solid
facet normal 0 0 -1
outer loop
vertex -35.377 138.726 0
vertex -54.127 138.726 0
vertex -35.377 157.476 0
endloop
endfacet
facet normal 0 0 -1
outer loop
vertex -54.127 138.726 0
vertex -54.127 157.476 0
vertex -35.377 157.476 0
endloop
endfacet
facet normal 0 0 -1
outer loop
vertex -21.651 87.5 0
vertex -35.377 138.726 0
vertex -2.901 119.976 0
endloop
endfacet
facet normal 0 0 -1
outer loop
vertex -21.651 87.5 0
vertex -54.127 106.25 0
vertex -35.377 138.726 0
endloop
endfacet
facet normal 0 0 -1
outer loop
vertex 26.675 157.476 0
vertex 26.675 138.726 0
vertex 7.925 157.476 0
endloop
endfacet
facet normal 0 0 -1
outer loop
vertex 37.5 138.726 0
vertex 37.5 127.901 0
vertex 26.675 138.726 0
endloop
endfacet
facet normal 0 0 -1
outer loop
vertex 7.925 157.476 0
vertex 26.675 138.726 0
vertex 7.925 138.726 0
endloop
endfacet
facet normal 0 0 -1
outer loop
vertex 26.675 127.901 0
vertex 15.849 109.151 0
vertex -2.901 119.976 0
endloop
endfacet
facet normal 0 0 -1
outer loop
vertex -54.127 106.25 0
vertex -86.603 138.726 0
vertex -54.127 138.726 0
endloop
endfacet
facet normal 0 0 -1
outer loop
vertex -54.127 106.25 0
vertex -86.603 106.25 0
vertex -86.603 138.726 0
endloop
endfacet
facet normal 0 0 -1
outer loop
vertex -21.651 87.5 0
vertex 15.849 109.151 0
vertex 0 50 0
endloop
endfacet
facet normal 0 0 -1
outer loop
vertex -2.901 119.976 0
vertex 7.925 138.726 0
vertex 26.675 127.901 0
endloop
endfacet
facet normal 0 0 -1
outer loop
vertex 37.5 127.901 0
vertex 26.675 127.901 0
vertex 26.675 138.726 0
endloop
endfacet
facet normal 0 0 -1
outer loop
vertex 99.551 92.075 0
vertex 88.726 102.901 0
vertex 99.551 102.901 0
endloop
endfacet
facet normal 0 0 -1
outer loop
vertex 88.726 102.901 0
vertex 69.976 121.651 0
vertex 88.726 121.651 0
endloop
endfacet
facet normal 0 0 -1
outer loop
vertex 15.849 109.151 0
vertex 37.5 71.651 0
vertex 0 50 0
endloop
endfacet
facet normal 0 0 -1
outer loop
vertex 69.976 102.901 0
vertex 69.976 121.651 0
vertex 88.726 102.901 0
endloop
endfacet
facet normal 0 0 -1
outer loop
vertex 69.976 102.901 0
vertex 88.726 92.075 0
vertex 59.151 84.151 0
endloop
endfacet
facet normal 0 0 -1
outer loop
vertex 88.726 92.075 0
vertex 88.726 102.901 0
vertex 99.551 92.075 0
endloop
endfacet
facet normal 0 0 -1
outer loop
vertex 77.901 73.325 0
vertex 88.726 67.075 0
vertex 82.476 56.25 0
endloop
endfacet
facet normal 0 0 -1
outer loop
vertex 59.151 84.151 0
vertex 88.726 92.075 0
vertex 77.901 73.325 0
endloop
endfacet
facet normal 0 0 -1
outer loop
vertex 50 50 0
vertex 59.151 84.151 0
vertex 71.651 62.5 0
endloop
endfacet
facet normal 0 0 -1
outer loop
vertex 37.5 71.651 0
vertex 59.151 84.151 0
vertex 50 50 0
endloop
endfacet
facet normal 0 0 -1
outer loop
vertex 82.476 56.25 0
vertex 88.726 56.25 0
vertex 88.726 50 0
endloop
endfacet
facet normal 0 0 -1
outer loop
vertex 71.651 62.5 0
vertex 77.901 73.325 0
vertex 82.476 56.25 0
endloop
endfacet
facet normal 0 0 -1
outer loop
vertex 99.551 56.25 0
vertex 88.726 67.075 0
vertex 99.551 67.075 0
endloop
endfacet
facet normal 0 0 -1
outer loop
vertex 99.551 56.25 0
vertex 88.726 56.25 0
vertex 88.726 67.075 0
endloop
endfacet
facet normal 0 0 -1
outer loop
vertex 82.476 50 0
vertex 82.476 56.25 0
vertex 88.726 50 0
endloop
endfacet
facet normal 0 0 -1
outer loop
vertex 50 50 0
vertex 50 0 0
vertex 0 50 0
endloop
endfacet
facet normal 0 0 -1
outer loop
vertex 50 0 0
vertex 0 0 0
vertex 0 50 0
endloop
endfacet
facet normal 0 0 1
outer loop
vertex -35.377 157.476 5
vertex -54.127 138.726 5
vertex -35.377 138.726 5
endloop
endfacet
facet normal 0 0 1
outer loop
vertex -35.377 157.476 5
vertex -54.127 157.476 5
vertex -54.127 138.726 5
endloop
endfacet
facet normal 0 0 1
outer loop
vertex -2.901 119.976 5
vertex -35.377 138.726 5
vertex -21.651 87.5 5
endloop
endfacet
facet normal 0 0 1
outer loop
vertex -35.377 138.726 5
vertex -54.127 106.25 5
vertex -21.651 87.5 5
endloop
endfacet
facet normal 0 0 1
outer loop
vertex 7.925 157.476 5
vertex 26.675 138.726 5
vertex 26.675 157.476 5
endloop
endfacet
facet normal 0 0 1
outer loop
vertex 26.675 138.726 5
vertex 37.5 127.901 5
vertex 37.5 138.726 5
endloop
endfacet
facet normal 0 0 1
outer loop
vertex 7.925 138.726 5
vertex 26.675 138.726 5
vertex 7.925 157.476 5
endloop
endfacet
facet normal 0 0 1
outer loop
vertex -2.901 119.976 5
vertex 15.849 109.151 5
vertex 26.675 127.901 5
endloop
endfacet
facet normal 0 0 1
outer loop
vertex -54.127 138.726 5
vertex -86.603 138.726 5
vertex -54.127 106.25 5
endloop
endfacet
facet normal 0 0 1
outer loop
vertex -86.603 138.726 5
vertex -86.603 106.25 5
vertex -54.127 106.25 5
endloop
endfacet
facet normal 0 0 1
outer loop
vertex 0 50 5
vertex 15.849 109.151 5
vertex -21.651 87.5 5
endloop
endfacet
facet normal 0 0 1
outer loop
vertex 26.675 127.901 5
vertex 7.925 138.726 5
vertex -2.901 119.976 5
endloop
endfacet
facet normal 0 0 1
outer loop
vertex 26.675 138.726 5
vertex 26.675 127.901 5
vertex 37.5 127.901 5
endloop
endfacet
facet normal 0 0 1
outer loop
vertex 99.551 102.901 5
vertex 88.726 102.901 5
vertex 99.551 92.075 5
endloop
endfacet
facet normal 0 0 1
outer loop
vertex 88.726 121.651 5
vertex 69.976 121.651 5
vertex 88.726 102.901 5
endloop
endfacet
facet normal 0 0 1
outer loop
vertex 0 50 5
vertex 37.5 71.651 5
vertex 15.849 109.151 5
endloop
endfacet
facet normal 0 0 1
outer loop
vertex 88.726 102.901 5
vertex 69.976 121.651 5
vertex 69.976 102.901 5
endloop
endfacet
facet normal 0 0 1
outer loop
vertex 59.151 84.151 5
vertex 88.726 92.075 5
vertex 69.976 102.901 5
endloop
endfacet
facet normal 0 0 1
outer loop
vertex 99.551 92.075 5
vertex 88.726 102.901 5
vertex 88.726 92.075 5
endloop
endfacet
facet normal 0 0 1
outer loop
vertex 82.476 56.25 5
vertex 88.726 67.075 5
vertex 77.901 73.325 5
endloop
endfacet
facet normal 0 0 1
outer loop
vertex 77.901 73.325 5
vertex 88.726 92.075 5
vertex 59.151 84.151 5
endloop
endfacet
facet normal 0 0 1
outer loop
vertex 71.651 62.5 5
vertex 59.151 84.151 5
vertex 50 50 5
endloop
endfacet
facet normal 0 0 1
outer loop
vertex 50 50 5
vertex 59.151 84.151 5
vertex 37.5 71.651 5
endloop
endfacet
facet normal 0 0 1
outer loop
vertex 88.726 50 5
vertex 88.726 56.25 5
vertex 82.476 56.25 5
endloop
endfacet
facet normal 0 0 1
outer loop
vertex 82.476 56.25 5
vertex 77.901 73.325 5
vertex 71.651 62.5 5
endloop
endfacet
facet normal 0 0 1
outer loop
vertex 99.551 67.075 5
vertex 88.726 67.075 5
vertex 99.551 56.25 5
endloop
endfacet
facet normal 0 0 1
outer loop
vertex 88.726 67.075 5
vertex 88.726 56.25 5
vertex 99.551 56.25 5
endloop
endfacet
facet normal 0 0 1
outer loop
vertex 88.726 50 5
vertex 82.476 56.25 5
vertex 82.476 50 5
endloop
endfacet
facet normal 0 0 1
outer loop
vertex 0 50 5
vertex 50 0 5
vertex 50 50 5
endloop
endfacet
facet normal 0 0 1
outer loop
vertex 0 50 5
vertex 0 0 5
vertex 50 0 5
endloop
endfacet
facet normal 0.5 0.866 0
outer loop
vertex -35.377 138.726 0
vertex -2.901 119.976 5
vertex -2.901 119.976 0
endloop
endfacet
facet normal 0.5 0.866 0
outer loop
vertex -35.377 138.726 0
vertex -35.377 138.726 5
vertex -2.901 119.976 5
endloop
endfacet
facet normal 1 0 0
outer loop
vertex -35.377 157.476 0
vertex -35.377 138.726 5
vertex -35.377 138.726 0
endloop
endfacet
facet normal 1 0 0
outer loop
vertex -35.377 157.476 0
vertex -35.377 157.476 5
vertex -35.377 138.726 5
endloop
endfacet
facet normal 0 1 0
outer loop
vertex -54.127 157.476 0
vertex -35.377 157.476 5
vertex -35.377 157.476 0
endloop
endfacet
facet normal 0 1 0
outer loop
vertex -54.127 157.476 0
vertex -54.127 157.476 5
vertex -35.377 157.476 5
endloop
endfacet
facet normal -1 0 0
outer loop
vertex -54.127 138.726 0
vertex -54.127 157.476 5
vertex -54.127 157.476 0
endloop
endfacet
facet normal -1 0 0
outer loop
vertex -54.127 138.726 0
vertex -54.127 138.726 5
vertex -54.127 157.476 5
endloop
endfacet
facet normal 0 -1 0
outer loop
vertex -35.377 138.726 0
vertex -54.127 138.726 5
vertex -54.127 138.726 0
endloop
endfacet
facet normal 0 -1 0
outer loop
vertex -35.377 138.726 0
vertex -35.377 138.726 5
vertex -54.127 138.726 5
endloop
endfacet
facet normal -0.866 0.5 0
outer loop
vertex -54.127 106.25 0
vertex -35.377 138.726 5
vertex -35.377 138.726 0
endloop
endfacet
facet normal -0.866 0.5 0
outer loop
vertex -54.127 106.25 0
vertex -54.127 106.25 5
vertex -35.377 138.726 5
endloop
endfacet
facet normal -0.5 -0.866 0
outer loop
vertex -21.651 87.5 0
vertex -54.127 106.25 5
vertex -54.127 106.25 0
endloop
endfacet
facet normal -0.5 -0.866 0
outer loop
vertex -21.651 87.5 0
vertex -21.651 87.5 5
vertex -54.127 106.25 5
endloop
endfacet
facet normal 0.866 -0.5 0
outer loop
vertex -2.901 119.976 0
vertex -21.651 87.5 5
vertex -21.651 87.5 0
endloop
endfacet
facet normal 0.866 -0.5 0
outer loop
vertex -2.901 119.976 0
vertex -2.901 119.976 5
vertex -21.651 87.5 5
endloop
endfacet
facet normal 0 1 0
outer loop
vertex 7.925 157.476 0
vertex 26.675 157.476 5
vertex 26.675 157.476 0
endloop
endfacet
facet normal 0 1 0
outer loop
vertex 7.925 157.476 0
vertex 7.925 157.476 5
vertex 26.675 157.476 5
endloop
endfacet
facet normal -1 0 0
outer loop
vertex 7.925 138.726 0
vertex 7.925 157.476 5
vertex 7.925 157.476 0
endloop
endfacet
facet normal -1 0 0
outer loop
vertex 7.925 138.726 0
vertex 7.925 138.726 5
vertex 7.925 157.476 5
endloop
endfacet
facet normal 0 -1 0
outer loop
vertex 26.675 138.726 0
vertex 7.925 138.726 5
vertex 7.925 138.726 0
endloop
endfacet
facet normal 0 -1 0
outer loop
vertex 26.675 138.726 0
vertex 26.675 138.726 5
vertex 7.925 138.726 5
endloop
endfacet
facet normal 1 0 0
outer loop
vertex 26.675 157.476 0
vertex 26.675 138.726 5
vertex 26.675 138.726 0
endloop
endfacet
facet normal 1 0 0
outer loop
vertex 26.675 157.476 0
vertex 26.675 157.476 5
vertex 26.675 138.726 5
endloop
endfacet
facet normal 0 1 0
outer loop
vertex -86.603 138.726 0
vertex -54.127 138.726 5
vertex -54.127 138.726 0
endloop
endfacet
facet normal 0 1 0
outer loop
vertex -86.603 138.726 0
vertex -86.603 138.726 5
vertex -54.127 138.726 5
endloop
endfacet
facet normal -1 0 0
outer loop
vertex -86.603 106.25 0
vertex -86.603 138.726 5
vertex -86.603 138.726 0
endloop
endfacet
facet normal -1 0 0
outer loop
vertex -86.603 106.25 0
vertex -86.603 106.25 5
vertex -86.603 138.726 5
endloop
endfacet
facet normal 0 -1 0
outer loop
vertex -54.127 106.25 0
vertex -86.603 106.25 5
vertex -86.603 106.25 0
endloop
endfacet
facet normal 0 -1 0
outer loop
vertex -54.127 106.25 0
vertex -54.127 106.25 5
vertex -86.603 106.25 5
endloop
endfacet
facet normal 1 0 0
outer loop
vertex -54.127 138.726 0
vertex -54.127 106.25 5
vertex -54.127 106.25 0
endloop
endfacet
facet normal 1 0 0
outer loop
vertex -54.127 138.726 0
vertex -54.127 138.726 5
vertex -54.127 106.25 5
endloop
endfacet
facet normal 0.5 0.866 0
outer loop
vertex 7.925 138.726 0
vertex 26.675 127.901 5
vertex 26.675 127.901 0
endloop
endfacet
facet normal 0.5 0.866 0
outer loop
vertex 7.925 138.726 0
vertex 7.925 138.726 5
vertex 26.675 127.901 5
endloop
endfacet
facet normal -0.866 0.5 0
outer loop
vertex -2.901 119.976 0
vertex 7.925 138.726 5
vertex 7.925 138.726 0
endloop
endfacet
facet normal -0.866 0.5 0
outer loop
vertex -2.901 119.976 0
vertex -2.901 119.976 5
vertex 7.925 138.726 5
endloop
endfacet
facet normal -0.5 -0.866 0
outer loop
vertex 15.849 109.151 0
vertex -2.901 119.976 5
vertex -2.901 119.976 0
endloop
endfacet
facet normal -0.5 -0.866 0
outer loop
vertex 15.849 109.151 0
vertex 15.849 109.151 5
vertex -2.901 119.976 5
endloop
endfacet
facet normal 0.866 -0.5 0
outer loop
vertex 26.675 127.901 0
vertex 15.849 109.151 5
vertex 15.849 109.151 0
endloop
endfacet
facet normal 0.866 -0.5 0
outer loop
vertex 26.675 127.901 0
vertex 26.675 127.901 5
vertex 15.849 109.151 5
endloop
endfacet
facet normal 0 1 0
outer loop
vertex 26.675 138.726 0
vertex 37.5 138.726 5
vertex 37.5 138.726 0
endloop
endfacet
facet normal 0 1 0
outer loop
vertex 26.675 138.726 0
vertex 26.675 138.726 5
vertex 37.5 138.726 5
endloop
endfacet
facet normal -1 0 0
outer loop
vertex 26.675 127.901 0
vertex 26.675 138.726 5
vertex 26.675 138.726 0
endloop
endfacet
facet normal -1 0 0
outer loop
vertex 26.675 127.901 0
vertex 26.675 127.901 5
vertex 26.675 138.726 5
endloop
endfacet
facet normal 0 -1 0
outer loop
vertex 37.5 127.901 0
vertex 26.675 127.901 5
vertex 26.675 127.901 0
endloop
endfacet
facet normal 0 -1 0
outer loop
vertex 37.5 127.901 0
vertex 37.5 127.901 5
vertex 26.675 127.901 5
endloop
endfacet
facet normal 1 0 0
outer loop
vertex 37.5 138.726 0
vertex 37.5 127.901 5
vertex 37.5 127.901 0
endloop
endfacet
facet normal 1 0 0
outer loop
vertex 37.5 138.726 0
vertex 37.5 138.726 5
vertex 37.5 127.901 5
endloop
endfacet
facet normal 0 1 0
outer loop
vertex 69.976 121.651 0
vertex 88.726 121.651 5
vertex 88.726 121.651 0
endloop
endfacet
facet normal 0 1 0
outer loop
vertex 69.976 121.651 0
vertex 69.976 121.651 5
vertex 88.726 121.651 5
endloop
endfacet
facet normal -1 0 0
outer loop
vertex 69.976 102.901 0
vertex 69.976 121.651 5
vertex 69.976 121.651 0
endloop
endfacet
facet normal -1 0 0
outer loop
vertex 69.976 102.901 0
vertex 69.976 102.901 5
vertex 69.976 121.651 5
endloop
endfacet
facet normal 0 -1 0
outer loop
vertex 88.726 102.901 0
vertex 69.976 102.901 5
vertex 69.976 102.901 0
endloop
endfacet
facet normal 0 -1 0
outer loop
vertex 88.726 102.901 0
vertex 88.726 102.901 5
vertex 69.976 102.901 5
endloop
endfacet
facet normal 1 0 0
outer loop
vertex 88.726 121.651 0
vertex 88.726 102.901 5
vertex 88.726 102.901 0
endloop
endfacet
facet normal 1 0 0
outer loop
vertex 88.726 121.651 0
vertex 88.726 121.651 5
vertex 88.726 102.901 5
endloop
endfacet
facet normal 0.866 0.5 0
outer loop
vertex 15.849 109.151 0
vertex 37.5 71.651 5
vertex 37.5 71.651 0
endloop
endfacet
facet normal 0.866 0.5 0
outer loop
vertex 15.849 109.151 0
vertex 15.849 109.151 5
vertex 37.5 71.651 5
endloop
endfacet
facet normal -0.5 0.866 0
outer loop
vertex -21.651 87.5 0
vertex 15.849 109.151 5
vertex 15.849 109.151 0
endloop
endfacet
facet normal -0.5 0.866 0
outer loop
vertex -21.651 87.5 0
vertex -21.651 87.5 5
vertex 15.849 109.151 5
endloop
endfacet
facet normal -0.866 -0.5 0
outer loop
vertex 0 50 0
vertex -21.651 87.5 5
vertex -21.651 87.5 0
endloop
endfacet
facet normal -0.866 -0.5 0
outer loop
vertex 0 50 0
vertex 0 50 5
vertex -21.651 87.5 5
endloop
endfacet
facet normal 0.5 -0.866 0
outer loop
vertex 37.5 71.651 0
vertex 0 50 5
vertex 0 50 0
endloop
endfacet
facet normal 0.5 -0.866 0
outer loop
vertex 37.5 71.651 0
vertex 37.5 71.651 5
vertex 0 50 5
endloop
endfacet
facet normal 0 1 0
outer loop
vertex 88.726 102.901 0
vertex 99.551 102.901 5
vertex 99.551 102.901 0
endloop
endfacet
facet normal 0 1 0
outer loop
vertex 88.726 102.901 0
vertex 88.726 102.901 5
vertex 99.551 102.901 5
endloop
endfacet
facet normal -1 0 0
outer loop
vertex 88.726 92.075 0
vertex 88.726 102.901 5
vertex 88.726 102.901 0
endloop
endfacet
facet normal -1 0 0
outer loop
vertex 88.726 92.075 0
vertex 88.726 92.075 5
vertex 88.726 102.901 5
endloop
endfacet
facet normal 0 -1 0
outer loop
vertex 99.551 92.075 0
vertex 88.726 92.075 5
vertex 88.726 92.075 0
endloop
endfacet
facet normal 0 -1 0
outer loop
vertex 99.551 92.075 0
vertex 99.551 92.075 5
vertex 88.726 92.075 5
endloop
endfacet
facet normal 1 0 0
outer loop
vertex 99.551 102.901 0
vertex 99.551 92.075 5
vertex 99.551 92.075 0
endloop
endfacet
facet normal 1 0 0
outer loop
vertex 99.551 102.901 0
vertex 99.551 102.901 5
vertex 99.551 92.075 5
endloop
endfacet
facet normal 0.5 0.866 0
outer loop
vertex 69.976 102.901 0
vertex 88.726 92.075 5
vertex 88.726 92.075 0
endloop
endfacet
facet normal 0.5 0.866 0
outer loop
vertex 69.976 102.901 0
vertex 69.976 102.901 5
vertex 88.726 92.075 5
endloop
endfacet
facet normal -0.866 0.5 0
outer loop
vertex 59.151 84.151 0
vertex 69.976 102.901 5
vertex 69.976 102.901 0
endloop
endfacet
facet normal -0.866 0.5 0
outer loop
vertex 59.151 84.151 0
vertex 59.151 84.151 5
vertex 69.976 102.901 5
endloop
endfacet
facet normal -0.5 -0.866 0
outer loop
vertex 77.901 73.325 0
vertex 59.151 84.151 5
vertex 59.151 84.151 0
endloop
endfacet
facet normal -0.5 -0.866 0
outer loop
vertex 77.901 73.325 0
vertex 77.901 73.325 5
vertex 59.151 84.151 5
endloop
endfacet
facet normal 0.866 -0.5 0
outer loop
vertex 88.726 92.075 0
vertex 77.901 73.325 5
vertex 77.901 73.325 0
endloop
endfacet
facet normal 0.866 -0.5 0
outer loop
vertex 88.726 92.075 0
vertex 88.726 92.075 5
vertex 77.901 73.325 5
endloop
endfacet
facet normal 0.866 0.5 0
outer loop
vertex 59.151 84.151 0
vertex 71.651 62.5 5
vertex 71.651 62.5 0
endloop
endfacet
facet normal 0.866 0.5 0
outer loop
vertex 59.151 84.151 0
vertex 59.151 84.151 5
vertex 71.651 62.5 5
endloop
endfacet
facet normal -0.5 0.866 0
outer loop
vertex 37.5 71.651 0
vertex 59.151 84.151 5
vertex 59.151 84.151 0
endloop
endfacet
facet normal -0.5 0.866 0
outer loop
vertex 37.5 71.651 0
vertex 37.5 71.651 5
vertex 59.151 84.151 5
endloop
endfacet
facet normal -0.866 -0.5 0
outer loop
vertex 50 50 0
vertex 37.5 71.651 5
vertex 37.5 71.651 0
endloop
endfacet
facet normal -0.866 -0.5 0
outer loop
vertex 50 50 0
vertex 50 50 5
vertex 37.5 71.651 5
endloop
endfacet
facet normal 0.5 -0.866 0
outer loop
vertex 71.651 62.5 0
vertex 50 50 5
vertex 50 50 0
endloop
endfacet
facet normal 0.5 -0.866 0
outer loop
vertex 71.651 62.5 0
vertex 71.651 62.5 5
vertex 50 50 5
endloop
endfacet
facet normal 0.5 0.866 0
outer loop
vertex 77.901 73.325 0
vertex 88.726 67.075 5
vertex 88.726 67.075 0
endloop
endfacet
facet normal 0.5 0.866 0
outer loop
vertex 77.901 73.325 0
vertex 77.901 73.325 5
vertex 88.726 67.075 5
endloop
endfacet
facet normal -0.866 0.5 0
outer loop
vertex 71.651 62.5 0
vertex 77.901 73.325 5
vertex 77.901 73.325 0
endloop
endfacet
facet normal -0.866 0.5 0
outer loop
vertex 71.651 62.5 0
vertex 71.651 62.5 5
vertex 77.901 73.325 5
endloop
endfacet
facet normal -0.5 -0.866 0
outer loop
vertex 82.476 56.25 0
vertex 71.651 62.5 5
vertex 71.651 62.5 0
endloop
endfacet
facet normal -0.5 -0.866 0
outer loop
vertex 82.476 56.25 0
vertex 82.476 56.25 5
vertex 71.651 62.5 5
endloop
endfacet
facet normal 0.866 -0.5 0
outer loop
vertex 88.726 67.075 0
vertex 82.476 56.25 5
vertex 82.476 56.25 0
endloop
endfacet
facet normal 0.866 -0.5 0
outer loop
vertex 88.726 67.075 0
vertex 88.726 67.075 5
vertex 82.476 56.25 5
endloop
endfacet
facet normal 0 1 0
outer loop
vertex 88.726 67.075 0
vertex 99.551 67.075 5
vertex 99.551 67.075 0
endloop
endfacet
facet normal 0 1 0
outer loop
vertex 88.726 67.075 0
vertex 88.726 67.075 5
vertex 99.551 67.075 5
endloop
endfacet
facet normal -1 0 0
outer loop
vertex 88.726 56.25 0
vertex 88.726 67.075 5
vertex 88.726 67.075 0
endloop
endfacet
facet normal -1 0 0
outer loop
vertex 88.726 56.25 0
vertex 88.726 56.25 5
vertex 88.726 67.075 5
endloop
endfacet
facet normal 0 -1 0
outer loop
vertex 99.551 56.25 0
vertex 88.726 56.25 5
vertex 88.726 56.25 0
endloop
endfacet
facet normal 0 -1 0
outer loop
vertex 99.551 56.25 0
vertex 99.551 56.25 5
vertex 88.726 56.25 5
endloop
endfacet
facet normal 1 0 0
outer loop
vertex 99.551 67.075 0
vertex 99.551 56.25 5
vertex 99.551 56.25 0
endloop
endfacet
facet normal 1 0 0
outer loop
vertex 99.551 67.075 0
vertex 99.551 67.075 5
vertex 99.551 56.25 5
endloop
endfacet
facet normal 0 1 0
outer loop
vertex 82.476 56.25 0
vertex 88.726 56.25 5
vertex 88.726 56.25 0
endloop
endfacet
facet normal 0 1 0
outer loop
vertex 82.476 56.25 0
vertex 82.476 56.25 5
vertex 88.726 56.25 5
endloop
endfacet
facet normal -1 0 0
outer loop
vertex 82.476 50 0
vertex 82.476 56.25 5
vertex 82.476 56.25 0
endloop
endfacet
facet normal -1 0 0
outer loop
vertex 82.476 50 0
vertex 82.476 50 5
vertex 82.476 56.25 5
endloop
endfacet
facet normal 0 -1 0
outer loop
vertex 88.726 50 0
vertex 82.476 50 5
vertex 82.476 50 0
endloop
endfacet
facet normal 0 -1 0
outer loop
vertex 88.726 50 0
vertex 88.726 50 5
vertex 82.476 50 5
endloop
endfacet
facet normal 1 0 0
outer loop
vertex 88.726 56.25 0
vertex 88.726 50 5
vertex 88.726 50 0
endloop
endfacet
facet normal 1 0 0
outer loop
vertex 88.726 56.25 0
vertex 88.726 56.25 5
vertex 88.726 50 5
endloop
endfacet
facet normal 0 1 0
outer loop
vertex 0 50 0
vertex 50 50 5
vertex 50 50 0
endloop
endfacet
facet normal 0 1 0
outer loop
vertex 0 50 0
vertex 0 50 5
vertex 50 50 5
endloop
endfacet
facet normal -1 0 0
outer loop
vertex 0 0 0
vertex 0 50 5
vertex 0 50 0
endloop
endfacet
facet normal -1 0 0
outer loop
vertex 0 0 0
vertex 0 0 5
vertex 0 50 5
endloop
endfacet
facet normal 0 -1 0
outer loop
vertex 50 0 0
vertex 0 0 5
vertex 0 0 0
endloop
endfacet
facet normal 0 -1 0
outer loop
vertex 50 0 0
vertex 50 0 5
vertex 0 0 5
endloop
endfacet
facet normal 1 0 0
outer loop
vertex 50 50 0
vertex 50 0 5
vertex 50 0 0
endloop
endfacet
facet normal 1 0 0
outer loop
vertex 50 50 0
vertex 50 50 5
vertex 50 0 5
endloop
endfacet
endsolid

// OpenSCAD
/* # Parameterized Pythagorean Tree
 *
 * A _Pythagorean Tree_ is a
 *
 * > plane fractal constructed from squares
 *
 * ## Parameters
 *
 * * **depth**: the maximum number of levels to render.
 * * **angle**: the angle which the next square is rotated.
 * * **size**: the size of the side of the base square.
 *
 */

linear_extrude(5) tree(depth = 3, angle=30, size=50);

module tree(depth=2, angle=45, size=10){
  square([size, size]);
  if (depth != 0) {
     translate([0   , size, 0]) rotate(angle) tree(depth=depth-1, angle=angle, size=size*cos(angle));
     translate([size*(1+cos(2*angle))/2, size*(1+sin(2*angle)/2), 0]) rotate(angle-90) tree(depth=depth-1, angle=angle, size=size*sin(angle));
  }
}
